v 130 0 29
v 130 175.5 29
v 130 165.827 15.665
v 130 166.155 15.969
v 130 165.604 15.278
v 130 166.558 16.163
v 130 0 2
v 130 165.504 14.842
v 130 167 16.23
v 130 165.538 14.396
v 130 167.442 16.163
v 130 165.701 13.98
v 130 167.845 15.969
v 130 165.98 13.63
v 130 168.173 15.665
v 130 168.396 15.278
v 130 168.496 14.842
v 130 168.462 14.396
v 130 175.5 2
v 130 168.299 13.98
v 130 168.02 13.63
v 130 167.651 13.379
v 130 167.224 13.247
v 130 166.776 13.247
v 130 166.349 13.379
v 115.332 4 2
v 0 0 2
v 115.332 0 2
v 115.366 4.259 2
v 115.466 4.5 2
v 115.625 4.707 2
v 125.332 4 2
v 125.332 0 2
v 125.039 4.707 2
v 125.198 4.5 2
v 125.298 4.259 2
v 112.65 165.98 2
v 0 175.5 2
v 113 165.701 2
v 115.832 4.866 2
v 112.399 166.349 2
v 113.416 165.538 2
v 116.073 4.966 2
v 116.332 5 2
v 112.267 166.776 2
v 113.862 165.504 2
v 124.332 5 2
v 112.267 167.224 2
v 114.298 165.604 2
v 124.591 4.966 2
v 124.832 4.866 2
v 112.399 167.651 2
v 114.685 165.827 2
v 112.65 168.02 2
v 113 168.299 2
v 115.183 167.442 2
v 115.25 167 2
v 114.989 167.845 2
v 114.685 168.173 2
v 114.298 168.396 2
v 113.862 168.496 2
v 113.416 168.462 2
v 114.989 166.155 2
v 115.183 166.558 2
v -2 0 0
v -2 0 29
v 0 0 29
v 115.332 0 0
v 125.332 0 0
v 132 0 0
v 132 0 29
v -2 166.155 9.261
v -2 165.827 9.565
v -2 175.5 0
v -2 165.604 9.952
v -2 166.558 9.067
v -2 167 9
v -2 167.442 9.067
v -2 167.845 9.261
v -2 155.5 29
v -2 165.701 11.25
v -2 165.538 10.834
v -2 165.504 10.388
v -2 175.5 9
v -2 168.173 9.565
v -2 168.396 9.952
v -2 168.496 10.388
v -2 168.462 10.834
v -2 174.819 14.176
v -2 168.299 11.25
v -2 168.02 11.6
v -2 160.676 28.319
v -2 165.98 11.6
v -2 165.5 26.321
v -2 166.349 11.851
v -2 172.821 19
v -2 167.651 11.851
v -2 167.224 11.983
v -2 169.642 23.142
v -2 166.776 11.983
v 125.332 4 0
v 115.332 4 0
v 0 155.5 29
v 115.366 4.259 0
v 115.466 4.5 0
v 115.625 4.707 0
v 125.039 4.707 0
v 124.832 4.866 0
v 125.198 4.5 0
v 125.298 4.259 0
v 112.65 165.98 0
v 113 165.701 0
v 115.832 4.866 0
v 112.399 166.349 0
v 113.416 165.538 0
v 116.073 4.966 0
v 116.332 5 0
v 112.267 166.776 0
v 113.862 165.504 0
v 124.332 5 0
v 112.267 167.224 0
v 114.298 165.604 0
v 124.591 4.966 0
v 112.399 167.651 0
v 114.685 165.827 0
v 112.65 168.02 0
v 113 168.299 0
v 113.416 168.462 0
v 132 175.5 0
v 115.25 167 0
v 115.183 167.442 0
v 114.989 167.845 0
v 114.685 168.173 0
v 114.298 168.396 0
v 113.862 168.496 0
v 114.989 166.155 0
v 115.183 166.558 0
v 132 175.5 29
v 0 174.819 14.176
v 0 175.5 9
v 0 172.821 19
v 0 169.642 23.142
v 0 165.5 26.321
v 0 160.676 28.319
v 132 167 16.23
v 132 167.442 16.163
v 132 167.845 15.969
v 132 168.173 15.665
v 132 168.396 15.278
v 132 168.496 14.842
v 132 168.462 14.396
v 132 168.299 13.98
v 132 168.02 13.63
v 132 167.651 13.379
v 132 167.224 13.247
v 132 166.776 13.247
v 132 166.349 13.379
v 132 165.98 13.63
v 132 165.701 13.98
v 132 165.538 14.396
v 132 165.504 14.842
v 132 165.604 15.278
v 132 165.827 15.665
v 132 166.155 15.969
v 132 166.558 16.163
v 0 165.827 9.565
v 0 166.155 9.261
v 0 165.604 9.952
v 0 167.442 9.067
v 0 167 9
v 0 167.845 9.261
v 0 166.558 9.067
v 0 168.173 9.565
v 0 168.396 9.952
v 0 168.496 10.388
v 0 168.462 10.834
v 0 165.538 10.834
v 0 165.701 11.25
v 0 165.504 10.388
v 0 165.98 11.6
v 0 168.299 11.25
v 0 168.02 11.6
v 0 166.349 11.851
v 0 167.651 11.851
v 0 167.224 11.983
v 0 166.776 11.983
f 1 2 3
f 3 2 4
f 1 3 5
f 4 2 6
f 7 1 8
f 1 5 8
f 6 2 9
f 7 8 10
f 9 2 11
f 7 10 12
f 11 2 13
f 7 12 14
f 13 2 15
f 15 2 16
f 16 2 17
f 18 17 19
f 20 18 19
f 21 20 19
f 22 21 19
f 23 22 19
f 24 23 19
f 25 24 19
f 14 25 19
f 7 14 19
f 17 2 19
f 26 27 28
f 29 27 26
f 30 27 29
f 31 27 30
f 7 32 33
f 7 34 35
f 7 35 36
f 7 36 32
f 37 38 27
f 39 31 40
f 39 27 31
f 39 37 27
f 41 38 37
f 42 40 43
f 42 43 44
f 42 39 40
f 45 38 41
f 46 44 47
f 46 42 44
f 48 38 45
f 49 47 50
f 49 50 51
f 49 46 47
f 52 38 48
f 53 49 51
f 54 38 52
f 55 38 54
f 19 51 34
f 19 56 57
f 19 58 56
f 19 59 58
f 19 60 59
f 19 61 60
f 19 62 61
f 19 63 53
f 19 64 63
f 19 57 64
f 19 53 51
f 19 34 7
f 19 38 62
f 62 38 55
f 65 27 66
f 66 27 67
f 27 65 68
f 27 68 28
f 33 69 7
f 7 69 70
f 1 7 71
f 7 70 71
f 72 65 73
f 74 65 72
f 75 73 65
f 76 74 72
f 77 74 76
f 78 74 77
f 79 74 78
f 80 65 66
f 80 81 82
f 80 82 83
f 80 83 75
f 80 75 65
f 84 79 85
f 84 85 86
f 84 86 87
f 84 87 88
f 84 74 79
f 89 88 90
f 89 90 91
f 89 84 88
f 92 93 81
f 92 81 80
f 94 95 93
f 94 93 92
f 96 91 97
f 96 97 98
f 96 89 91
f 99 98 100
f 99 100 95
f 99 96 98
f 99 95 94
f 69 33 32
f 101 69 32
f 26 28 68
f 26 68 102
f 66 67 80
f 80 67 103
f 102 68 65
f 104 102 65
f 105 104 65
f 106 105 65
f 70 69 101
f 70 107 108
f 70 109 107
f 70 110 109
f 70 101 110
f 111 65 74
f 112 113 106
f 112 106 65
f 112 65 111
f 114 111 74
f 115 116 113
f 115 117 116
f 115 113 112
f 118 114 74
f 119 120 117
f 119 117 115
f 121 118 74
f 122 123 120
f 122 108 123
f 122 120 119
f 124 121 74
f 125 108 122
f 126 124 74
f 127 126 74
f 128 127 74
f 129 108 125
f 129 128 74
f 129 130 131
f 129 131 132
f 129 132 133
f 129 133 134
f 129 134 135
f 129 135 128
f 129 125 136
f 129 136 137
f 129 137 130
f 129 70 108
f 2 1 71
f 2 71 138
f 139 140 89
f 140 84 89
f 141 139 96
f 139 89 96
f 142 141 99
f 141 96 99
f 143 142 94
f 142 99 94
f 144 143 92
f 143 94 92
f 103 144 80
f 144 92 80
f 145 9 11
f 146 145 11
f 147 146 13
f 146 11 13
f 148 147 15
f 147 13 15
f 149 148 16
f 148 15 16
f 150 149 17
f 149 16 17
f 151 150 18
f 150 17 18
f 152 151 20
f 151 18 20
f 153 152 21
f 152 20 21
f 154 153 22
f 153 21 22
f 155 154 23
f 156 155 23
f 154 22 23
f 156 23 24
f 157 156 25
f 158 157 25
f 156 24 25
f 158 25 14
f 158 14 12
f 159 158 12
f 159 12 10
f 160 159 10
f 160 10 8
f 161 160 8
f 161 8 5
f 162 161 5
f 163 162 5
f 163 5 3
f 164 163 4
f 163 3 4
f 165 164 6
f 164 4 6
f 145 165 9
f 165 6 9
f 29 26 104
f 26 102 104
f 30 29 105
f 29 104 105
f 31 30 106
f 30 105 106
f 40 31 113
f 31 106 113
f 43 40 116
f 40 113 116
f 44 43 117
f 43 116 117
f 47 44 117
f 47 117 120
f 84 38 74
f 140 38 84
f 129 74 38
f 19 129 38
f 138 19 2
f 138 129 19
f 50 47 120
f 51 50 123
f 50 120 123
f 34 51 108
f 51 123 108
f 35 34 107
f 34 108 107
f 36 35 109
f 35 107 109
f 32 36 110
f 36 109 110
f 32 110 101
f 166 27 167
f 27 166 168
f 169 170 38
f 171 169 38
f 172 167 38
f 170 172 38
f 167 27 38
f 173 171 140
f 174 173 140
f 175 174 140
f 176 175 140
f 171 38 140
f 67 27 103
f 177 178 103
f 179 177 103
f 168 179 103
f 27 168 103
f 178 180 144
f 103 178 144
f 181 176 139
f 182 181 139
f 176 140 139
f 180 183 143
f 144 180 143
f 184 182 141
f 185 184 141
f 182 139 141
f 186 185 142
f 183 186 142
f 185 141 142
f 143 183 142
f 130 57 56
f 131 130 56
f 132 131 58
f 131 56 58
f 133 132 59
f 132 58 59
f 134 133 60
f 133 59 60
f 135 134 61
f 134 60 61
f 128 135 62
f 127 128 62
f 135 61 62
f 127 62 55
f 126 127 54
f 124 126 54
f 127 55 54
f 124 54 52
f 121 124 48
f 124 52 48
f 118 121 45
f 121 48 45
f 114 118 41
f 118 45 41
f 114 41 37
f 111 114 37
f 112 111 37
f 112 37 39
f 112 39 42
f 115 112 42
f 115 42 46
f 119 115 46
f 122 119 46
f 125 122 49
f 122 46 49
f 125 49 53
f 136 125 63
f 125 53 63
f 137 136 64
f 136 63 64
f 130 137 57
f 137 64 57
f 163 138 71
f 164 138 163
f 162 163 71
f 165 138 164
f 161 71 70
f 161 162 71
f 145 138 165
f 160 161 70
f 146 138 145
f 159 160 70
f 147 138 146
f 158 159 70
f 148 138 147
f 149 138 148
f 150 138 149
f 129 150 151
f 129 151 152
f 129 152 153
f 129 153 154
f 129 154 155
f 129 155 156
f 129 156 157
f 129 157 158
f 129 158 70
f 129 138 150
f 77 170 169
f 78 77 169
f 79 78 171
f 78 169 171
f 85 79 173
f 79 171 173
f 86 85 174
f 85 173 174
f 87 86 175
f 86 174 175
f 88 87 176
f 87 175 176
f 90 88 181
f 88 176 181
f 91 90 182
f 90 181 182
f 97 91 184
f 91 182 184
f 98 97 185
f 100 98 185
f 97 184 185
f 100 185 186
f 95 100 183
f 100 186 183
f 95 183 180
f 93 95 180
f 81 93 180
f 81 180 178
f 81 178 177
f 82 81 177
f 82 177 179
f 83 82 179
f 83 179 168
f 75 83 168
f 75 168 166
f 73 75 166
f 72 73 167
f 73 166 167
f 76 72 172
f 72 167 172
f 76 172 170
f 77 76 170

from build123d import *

# Parameters (mm, degrees)
SKETCH1_W           = 130
SKETCH1_H           = 175.5
BOSS_EXTRUDE1_DEPTH = 2
SKETCH2_W           = 29
SKETCH2_H           = 175.5
BOSS_EXTRUDE2_DEPTH = 2
SKETCH3_W           = 29
SKETCH3_H           = 175.5
BOSS_EXTRUDE3_DEPTH = 2
SKETCH4_W           = 10
SKETCH4_H           = 5
CUT_EXTRUDE1_DEPTH  = 4
FILLET1_R           = 20
FILLET2_R           = 1
SKETCH5_R           = 1.5
CUT_EXTRUDE2_DEPTH  = 2
SKETCH6_R           = 1.5
CUT_EXTRUDE3_DEPTH  = 2
SKETCH7_R           = 1.5
CUT_EXTRUDE4_DEPTH  = 2


with BuildPart() as part:
    # Sketch1 → Boss-Extrude1 (new body)
    with BuildSketch(Plane.XY):
        with Locations((65, 87.75)):
            Rectangle(SKETCH1_W, SKETCH1_H)
    extrude(amount=BOSS_EXTRUDE1_DEPTH)

    # Sketch2 → Boss-Extrude2 (add)
    with BuildSketch(Plane(origin=(130, 0, 0), x_dir=(0, 0, -1), z_dir=(1, 0, 0))):
        with Locations((-14.5, 87.75)):
            Rectangle(SKETCH2_W, SKETCH2_H)
    extrude(amount=BOSS_EXTRUDE2_DEPTH)

    # Sketch3 → Boss-Extrude3 (add)
    with BuildSketch(Plane.ZY):
        with Locations((14.5, 87.75)):
            Rectangle(SKETCH3_W, SKETCH3_H)
    extrude(amount=BOSS_EXTRUDE3_DEPTH)

    # Sketch4 → Cut-Extrude1 (cut)
    with BuildSketch(Plane.XY.offset(2)):
        with Locations((120.332257012, 2.5)):
            Rectangle(SKETCH4_W, SKETCH4_H)
    extrude(amount=-CUT_EXTRUDE1_DEPTH, mode=Mode.SUBTRACT)

    # Fillet1
    fillet1_edges = [part.edges().sort_by_distance(p)[0] for p in [
        (-1, 175.5, 29),
    ]]
    fillet(fillet1_edges, radius=FILLET1_R)

    # Fillet2
    fillet2_edges = [part.edges().sort_by_distance(p)[0] for p in [
        (115.332257012, 5, 1),
        (125.332257012, 5, 1),
    ]]
    fillet(fillet2_edges, radius=FILLET2_R)

    # Sketch5 → Cut-Extrude2 (cut)
    with BuildSketch(Plane.ZY.offset(-130)):
        with Locations((14.73, 167)):
            Circle(SKETCH5_R)
    extrude(amount=-CUT_EXTRUDE2_DEPTH, mode=Mode.SUBTRACT)

    # Sketch6 → Cut-Extrude3 (cut)
    with BuildSketch(Plane.XY.offset(2)):
        with Locations((113.75, 167)):
            Circle(SKETCH6_R)
    extrude(amount=-CUT_EXTRUDE3_DEPTH, mode=Mode.SUBTRACT)

    # Sketch7 → Cut-Extrude4 (cut)
    with BuildSketch(Plane(origin=(0, 0, 0), x_dir=(0, 0, -1), z_dir=(1, 0, 0))):
        with Locations((-10.5, 167)):
            Circle(SKETCH7_R)
    extrude(amount=-CUT_EXTRUDE4_DEPTH, mode=Mode.SUBTRACT)


solid = part.part
